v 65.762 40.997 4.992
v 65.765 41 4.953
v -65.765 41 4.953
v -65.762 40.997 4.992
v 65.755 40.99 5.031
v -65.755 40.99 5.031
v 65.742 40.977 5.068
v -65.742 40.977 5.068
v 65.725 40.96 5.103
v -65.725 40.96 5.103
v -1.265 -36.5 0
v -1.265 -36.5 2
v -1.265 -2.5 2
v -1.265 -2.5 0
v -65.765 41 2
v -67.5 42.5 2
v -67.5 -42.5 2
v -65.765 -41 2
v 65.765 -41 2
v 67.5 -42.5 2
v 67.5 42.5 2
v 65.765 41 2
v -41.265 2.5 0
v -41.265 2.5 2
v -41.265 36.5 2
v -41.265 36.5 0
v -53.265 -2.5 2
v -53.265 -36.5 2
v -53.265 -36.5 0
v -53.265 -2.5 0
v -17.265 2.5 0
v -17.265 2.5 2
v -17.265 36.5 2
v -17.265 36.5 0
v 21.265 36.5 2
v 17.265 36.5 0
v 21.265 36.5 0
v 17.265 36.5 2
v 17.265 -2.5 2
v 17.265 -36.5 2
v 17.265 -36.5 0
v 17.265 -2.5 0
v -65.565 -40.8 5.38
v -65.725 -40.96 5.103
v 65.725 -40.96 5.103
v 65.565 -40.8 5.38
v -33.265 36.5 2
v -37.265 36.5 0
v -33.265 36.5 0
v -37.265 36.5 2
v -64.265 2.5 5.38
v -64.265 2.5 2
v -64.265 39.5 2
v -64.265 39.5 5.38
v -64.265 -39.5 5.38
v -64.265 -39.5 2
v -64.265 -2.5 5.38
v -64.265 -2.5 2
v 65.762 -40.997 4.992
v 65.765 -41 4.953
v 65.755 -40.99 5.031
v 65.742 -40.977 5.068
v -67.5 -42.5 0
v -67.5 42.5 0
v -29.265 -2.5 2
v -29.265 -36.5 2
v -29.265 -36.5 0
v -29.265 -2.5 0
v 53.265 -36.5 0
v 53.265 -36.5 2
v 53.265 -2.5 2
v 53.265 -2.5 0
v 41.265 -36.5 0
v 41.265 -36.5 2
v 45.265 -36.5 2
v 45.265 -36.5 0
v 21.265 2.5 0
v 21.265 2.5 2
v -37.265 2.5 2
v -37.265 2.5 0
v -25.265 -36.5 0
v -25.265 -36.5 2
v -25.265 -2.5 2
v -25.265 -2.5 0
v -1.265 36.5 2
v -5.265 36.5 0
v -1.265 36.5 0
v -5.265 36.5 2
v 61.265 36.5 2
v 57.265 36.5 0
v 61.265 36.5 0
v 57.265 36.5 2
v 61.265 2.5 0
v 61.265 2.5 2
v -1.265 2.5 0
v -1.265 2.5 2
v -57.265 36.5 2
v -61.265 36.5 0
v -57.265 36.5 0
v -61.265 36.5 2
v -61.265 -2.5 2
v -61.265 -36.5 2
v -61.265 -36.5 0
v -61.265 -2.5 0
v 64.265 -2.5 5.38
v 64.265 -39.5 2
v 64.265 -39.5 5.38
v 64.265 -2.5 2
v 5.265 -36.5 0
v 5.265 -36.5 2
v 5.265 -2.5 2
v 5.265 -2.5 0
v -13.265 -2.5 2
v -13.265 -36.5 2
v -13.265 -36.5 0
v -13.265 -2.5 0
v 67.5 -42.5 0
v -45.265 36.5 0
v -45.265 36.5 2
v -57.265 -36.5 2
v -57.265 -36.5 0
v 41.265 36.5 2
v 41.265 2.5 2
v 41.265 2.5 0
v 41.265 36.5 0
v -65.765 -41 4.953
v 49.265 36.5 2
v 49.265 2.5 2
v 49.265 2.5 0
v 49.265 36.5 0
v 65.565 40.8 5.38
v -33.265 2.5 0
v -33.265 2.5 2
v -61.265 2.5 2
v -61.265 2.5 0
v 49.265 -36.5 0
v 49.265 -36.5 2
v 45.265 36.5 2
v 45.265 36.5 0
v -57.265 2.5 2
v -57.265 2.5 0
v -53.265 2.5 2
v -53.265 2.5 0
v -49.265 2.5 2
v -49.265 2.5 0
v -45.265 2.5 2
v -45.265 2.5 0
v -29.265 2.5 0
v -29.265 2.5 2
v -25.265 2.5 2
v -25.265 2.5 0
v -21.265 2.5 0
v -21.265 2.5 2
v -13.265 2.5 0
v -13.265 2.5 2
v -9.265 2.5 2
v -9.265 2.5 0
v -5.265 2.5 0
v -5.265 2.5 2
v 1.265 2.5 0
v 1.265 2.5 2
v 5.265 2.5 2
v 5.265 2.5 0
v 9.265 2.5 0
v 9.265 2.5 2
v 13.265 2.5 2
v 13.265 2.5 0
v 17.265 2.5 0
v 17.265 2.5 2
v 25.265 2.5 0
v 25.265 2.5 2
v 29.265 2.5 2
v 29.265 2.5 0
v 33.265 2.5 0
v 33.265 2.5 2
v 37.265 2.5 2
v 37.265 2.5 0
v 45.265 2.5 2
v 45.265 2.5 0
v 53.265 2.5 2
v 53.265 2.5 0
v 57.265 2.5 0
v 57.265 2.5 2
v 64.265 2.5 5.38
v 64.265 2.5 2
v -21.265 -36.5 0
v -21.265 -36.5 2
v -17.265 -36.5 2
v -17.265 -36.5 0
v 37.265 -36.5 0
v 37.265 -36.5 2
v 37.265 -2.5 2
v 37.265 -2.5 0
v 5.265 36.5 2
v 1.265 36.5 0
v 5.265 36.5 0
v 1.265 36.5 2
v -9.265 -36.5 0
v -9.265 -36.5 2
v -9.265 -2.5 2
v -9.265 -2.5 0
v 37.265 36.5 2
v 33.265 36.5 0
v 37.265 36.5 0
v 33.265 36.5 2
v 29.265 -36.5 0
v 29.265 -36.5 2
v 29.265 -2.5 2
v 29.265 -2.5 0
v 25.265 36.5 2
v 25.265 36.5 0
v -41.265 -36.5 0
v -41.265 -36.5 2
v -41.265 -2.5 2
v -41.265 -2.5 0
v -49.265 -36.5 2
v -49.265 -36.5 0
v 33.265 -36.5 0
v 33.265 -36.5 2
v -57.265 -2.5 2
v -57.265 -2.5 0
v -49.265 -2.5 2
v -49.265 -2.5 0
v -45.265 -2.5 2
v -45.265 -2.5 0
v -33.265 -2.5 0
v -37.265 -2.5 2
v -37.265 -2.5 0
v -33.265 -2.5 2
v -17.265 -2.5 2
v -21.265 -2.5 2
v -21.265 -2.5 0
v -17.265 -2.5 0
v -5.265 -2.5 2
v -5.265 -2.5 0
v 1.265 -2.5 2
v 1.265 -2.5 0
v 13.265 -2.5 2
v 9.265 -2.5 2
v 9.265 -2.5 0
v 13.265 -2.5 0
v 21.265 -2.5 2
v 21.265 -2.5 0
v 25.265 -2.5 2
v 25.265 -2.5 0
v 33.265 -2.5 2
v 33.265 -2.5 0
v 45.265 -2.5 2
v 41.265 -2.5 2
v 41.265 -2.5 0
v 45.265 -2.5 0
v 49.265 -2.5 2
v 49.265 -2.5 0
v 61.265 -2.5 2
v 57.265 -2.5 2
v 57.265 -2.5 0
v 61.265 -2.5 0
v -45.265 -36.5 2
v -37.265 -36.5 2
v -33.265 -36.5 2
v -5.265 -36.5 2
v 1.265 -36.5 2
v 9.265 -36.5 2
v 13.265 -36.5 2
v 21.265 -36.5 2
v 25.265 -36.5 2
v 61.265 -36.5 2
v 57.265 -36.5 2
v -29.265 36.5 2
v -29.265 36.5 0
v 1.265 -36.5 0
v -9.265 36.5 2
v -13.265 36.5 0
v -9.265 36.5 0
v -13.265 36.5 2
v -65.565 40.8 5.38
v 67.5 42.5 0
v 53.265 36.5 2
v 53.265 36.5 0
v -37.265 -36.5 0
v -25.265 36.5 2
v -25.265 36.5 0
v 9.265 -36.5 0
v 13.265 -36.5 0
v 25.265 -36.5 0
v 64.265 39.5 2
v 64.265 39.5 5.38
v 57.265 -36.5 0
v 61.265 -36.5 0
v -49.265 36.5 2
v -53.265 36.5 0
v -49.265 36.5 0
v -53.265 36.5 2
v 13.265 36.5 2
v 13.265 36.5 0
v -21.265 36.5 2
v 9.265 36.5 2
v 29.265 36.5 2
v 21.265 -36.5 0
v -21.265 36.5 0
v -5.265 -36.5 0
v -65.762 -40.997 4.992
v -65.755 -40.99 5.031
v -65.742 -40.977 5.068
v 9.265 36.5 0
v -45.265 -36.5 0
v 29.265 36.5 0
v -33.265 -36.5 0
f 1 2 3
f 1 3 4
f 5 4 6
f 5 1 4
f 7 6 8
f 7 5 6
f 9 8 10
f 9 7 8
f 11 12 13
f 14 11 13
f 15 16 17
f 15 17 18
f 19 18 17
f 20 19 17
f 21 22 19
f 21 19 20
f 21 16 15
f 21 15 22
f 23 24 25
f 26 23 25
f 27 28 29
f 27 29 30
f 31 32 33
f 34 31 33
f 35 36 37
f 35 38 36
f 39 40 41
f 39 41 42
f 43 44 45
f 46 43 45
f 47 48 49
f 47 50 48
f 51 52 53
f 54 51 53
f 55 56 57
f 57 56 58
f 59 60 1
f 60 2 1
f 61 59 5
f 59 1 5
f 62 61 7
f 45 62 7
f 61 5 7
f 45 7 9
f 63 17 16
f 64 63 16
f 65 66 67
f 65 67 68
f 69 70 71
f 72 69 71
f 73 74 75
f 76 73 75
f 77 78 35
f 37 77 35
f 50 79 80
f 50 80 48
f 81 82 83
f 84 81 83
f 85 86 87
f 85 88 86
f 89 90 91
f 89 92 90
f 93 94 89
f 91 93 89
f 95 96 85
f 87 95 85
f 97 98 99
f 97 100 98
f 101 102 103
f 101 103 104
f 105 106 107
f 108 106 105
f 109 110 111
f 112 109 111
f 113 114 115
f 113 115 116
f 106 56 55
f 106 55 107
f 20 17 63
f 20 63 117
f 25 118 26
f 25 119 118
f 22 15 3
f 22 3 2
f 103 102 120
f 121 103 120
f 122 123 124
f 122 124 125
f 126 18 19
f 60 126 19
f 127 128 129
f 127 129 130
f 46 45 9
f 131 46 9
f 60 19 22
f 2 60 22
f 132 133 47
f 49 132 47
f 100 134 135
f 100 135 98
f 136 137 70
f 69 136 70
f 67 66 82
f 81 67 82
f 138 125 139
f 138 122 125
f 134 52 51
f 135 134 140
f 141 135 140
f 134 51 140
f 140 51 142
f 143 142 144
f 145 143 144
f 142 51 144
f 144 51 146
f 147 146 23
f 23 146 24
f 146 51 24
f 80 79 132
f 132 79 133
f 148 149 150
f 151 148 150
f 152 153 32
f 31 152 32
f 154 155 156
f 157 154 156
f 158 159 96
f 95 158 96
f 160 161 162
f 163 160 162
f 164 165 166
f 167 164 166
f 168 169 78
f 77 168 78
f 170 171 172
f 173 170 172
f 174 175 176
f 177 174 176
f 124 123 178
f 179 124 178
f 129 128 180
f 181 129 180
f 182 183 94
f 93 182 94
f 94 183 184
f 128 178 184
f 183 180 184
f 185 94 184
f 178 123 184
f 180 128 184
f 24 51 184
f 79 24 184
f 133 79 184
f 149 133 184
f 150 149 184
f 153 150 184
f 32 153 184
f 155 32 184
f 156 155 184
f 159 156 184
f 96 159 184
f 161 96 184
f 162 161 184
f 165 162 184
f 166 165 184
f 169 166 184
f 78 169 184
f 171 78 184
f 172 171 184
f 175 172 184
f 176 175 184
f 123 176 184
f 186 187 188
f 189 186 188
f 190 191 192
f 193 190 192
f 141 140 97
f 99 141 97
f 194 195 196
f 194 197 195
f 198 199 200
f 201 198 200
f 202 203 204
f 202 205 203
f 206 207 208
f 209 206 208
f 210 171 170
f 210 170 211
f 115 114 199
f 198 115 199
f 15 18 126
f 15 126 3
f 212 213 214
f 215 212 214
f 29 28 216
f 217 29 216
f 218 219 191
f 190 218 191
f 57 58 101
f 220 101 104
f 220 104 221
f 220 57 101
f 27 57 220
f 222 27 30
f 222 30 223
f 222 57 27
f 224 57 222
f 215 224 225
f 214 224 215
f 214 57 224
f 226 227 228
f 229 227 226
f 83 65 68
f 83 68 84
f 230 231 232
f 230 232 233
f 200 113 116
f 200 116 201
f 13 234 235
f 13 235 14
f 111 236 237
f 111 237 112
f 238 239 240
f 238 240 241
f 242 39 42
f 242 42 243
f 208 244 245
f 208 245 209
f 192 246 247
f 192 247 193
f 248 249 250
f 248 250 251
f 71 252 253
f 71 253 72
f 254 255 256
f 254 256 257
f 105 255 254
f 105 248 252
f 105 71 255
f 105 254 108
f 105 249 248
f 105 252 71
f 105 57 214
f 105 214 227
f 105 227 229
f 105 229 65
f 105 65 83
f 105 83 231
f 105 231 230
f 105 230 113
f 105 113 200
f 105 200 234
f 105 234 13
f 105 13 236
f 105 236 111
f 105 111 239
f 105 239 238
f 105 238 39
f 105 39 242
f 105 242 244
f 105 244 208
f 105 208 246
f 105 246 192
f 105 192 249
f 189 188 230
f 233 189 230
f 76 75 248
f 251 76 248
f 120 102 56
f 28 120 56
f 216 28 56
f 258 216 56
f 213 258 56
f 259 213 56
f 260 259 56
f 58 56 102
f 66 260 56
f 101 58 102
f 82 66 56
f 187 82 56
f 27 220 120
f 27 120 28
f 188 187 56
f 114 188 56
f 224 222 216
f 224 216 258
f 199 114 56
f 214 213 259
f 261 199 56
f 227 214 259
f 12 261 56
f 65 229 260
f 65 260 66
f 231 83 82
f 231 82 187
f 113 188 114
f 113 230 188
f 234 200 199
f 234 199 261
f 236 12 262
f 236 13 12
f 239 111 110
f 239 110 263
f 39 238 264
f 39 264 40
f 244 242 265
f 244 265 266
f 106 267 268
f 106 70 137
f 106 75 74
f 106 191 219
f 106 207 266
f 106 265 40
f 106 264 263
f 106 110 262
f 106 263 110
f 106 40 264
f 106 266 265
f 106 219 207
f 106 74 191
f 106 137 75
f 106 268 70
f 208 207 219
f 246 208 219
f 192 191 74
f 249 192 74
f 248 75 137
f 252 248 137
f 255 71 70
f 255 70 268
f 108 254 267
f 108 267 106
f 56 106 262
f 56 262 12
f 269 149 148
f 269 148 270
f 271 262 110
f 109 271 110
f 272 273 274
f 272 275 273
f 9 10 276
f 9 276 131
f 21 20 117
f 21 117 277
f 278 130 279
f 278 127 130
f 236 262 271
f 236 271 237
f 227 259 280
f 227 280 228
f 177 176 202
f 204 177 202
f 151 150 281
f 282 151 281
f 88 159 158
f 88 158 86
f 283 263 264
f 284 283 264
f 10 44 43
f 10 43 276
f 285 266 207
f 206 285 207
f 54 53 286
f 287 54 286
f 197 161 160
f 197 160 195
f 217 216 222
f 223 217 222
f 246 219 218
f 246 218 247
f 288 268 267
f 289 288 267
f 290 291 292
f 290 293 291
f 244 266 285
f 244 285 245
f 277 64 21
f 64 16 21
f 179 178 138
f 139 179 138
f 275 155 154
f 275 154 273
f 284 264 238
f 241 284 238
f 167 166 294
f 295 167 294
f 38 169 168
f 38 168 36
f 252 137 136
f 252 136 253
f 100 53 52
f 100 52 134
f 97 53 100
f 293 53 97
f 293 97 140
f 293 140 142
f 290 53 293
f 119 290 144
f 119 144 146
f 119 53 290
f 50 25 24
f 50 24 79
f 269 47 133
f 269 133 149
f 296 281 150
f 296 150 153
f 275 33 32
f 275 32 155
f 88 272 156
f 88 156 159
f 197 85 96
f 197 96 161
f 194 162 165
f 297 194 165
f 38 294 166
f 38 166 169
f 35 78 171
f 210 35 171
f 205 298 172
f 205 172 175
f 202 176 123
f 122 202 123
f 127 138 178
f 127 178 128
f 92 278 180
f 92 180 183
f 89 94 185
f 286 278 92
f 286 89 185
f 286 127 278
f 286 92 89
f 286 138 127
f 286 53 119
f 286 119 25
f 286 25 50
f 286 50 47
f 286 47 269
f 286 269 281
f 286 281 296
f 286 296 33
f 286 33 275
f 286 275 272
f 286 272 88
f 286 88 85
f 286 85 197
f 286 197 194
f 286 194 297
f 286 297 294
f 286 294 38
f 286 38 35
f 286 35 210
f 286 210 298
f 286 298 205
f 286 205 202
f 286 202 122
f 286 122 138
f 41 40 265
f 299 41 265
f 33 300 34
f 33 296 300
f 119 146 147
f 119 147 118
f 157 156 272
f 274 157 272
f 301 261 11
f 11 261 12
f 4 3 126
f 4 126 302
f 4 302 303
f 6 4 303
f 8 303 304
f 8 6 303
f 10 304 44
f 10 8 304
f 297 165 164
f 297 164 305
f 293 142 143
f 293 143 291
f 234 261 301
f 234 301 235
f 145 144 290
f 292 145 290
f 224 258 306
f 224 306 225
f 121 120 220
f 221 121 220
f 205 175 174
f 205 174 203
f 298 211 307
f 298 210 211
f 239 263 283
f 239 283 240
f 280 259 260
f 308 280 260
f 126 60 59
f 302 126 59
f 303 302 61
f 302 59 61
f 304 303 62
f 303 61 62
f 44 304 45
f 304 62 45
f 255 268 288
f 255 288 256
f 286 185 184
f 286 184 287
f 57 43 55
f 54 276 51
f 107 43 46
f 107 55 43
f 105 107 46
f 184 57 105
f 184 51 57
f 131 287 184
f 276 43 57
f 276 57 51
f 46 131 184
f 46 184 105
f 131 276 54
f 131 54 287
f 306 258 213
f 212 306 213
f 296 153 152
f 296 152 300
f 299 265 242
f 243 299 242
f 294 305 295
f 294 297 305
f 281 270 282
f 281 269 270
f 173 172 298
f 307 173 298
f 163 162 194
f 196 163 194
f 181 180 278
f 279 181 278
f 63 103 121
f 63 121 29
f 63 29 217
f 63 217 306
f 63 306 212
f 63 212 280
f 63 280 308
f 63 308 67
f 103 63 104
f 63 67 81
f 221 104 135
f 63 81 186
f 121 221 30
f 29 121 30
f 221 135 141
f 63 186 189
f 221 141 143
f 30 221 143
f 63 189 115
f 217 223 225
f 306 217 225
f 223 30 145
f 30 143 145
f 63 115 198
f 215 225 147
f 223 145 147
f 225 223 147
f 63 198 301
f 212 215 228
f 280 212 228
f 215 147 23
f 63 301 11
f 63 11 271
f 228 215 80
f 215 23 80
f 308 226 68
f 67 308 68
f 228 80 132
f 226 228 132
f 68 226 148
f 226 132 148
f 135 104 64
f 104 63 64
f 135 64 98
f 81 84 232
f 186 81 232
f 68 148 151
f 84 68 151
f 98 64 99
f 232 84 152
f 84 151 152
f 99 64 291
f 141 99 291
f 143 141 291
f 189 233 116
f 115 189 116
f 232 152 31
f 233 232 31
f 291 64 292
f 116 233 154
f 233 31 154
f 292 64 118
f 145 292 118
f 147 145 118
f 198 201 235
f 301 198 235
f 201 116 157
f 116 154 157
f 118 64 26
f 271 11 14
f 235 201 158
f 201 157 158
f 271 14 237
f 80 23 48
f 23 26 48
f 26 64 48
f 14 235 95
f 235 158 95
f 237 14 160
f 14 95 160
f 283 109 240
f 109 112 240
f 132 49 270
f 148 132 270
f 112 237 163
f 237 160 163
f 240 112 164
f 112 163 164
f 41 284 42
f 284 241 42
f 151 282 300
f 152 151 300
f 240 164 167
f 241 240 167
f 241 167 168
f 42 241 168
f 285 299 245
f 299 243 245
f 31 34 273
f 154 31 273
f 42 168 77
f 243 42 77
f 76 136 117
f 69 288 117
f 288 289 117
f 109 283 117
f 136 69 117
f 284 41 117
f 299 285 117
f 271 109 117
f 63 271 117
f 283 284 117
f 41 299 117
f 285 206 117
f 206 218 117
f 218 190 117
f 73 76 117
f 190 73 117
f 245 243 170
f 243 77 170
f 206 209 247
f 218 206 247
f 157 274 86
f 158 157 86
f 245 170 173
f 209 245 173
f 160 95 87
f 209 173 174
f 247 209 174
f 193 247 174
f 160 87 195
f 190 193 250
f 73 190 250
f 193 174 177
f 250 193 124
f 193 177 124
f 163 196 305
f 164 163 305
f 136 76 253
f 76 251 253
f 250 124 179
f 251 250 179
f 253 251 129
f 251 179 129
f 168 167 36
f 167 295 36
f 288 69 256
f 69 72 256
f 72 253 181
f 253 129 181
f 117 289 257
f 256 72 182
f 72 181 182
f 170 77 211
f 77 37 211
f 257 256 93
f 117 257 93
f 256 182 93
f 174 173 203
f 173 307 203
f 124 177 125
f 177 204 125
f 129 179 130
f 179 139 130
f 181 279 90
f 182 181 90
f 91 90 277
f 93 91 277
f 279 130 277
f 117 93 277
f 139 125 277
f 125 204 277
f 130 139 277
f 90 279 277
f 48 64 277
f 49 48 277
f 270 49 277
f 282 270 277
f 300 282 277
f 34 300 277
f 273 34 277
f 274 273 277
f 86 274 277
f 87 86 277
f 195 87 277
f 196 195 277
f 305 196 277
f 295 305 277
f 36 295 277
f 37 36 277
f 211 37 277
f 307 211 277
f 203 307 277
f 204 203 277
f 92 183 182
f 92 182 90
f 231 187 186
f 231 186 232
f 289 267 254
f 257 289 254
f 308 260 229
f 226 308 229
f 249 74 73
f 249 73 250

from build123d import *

# Parameters (mm, degrees)
F0_W      = 135
F0_H      = 85
F1_DEPTH  = 2
F2_W      = 131.53
F2_H      = 82
F2_W_2    = 128.53
F2_H_2    = 79
F3_DEPTH  = 3.38
F4_SIZE2  = 0.3464101615
F4_SIZE   = 0.2
F5_R      = 0.3
F6_W      = 4
F6_H      = 73
F7_DEPTH  = 25
F8_DEPTH  = 1
F9_DEPTH  = 1
F10_W     = 128.53
F10_H     = 5
F11_DEPTH = 5.38


with BuildPart() as f1:
    # F0 (on Top) → F1 (new body)
    with BuildSketch(Plane.XY):
        Rectangle(F0_W, F0_H)
    extrude(amount=F1_DEPTH)

    # F2 (on face) → F3 (join)
    with BuildSketch(Plane.XY.offset(2)):
        Rectangle(F2_W, F2_H)
        Rectangle(F2_W_2, F2_H_2, mode=Mode.SUBTRACT)
    extrude(amount=F3_DEPTH)

    # F4
    f4_edges = [f1.edges().sort_by_distance(p)[0] for p in [
        (-65.765, 0, 5.38),
        (0, 41, 5.38),
        (0, -41, 5.38),
        (65.765, 0, 5.38),
    ]]
    f4_side = f1.faces().sort_by_distance((0, 40.845003, 5.38))[0]
    chamfer(f4_edges, length=F4_SIZE, length2=F4_SIZE2, reference=f4_side)

    # F5
    f5_edges = [f1.edges().sort_by_distance(p)[0] for p in [
        (65.765, 0, 5.03359),
        (0, 41, 5.03359),
        (0, -41, 5.03359),
        (-65.765, 0, 5.03359),
    ]]
    fillet(f5_edges, radius=F5_R)

    # F6 (on face) → F7 (cut)
    with BuildSketch(Plane.XY.offset(2)):
        with Locations((-59.265, 0)):
            Rectangle(F6_W, F6_H)
        with Locations((-51.265, 0)):
            Rectangle(F6_W, F6_H)
        with Locations((-43.265, 0)):
            Rectangle(F6_W, F6_H)
        with Locations((-35.265, 0)):
            Rectangle(F6_W, F6_H)
        with Locations((-27.265, 0)):
            Rectangle(F6_W, F6_H)
        with Locations((-19.265, 0)):
            Rectangle(F6_W, F6_H)
        with Locations((-11.265, 0)):
            Rectangle(F6_W, F6_H)
        with Locations((-3.265, 0)):
            Rectangle(F6_W, F6_H)
        with Locations((35.265, 0)):
            Rectangle(F6_W, F6_H)
        with Locations((43.265, 0)):
            Rectangle(F6_W, F6_H)
        with Locations((51.265, 0)):
            Rectangle(F6_W, F6_H)
        with Locations((3.265, 0)):
            Rectangle(F6_W, F6_H)
        with Locations((59.265, 0)):
            Rectangle(F6_W, F6_H)
        with Locations((11.265, 0)):
            Rectangle(F6_W, F6_H)
        with Locations((19.265, 0)):
            Rectangle(F6_W, F6_H)
        with Locations((27.265, 0)):
            Rectangle(F6_W, F6_H)
    extrude(amount=-F7_DEPTH, mode=Mode.SUBTRACT)

    # F8 (cut): a face of the model
    f8_faces = [f1.faces().sort_by_distance(p)[0] for p in [
        (0, 0, 0),
    ]]
    extrude(f8_faces, amount=-F8_DEPTH, mode=Mode.SUBTRACT)

    # F9 (add): a face of the model
    f9_faces = [f1.faces().sort_by_distance(p)[0] for p in [
        (0, 0, 1),
    ]]
    extrude(f9_faces, amount=F9_DEPTH)

    # F10 (on face) → F11 (join, through all)
    with BuildSketch(Plane.XY.offset(5.38)):
        Rectangle(F10_W, F10_H)
    extrude(amount=-F11_DEPTH)


solid = f1.part
